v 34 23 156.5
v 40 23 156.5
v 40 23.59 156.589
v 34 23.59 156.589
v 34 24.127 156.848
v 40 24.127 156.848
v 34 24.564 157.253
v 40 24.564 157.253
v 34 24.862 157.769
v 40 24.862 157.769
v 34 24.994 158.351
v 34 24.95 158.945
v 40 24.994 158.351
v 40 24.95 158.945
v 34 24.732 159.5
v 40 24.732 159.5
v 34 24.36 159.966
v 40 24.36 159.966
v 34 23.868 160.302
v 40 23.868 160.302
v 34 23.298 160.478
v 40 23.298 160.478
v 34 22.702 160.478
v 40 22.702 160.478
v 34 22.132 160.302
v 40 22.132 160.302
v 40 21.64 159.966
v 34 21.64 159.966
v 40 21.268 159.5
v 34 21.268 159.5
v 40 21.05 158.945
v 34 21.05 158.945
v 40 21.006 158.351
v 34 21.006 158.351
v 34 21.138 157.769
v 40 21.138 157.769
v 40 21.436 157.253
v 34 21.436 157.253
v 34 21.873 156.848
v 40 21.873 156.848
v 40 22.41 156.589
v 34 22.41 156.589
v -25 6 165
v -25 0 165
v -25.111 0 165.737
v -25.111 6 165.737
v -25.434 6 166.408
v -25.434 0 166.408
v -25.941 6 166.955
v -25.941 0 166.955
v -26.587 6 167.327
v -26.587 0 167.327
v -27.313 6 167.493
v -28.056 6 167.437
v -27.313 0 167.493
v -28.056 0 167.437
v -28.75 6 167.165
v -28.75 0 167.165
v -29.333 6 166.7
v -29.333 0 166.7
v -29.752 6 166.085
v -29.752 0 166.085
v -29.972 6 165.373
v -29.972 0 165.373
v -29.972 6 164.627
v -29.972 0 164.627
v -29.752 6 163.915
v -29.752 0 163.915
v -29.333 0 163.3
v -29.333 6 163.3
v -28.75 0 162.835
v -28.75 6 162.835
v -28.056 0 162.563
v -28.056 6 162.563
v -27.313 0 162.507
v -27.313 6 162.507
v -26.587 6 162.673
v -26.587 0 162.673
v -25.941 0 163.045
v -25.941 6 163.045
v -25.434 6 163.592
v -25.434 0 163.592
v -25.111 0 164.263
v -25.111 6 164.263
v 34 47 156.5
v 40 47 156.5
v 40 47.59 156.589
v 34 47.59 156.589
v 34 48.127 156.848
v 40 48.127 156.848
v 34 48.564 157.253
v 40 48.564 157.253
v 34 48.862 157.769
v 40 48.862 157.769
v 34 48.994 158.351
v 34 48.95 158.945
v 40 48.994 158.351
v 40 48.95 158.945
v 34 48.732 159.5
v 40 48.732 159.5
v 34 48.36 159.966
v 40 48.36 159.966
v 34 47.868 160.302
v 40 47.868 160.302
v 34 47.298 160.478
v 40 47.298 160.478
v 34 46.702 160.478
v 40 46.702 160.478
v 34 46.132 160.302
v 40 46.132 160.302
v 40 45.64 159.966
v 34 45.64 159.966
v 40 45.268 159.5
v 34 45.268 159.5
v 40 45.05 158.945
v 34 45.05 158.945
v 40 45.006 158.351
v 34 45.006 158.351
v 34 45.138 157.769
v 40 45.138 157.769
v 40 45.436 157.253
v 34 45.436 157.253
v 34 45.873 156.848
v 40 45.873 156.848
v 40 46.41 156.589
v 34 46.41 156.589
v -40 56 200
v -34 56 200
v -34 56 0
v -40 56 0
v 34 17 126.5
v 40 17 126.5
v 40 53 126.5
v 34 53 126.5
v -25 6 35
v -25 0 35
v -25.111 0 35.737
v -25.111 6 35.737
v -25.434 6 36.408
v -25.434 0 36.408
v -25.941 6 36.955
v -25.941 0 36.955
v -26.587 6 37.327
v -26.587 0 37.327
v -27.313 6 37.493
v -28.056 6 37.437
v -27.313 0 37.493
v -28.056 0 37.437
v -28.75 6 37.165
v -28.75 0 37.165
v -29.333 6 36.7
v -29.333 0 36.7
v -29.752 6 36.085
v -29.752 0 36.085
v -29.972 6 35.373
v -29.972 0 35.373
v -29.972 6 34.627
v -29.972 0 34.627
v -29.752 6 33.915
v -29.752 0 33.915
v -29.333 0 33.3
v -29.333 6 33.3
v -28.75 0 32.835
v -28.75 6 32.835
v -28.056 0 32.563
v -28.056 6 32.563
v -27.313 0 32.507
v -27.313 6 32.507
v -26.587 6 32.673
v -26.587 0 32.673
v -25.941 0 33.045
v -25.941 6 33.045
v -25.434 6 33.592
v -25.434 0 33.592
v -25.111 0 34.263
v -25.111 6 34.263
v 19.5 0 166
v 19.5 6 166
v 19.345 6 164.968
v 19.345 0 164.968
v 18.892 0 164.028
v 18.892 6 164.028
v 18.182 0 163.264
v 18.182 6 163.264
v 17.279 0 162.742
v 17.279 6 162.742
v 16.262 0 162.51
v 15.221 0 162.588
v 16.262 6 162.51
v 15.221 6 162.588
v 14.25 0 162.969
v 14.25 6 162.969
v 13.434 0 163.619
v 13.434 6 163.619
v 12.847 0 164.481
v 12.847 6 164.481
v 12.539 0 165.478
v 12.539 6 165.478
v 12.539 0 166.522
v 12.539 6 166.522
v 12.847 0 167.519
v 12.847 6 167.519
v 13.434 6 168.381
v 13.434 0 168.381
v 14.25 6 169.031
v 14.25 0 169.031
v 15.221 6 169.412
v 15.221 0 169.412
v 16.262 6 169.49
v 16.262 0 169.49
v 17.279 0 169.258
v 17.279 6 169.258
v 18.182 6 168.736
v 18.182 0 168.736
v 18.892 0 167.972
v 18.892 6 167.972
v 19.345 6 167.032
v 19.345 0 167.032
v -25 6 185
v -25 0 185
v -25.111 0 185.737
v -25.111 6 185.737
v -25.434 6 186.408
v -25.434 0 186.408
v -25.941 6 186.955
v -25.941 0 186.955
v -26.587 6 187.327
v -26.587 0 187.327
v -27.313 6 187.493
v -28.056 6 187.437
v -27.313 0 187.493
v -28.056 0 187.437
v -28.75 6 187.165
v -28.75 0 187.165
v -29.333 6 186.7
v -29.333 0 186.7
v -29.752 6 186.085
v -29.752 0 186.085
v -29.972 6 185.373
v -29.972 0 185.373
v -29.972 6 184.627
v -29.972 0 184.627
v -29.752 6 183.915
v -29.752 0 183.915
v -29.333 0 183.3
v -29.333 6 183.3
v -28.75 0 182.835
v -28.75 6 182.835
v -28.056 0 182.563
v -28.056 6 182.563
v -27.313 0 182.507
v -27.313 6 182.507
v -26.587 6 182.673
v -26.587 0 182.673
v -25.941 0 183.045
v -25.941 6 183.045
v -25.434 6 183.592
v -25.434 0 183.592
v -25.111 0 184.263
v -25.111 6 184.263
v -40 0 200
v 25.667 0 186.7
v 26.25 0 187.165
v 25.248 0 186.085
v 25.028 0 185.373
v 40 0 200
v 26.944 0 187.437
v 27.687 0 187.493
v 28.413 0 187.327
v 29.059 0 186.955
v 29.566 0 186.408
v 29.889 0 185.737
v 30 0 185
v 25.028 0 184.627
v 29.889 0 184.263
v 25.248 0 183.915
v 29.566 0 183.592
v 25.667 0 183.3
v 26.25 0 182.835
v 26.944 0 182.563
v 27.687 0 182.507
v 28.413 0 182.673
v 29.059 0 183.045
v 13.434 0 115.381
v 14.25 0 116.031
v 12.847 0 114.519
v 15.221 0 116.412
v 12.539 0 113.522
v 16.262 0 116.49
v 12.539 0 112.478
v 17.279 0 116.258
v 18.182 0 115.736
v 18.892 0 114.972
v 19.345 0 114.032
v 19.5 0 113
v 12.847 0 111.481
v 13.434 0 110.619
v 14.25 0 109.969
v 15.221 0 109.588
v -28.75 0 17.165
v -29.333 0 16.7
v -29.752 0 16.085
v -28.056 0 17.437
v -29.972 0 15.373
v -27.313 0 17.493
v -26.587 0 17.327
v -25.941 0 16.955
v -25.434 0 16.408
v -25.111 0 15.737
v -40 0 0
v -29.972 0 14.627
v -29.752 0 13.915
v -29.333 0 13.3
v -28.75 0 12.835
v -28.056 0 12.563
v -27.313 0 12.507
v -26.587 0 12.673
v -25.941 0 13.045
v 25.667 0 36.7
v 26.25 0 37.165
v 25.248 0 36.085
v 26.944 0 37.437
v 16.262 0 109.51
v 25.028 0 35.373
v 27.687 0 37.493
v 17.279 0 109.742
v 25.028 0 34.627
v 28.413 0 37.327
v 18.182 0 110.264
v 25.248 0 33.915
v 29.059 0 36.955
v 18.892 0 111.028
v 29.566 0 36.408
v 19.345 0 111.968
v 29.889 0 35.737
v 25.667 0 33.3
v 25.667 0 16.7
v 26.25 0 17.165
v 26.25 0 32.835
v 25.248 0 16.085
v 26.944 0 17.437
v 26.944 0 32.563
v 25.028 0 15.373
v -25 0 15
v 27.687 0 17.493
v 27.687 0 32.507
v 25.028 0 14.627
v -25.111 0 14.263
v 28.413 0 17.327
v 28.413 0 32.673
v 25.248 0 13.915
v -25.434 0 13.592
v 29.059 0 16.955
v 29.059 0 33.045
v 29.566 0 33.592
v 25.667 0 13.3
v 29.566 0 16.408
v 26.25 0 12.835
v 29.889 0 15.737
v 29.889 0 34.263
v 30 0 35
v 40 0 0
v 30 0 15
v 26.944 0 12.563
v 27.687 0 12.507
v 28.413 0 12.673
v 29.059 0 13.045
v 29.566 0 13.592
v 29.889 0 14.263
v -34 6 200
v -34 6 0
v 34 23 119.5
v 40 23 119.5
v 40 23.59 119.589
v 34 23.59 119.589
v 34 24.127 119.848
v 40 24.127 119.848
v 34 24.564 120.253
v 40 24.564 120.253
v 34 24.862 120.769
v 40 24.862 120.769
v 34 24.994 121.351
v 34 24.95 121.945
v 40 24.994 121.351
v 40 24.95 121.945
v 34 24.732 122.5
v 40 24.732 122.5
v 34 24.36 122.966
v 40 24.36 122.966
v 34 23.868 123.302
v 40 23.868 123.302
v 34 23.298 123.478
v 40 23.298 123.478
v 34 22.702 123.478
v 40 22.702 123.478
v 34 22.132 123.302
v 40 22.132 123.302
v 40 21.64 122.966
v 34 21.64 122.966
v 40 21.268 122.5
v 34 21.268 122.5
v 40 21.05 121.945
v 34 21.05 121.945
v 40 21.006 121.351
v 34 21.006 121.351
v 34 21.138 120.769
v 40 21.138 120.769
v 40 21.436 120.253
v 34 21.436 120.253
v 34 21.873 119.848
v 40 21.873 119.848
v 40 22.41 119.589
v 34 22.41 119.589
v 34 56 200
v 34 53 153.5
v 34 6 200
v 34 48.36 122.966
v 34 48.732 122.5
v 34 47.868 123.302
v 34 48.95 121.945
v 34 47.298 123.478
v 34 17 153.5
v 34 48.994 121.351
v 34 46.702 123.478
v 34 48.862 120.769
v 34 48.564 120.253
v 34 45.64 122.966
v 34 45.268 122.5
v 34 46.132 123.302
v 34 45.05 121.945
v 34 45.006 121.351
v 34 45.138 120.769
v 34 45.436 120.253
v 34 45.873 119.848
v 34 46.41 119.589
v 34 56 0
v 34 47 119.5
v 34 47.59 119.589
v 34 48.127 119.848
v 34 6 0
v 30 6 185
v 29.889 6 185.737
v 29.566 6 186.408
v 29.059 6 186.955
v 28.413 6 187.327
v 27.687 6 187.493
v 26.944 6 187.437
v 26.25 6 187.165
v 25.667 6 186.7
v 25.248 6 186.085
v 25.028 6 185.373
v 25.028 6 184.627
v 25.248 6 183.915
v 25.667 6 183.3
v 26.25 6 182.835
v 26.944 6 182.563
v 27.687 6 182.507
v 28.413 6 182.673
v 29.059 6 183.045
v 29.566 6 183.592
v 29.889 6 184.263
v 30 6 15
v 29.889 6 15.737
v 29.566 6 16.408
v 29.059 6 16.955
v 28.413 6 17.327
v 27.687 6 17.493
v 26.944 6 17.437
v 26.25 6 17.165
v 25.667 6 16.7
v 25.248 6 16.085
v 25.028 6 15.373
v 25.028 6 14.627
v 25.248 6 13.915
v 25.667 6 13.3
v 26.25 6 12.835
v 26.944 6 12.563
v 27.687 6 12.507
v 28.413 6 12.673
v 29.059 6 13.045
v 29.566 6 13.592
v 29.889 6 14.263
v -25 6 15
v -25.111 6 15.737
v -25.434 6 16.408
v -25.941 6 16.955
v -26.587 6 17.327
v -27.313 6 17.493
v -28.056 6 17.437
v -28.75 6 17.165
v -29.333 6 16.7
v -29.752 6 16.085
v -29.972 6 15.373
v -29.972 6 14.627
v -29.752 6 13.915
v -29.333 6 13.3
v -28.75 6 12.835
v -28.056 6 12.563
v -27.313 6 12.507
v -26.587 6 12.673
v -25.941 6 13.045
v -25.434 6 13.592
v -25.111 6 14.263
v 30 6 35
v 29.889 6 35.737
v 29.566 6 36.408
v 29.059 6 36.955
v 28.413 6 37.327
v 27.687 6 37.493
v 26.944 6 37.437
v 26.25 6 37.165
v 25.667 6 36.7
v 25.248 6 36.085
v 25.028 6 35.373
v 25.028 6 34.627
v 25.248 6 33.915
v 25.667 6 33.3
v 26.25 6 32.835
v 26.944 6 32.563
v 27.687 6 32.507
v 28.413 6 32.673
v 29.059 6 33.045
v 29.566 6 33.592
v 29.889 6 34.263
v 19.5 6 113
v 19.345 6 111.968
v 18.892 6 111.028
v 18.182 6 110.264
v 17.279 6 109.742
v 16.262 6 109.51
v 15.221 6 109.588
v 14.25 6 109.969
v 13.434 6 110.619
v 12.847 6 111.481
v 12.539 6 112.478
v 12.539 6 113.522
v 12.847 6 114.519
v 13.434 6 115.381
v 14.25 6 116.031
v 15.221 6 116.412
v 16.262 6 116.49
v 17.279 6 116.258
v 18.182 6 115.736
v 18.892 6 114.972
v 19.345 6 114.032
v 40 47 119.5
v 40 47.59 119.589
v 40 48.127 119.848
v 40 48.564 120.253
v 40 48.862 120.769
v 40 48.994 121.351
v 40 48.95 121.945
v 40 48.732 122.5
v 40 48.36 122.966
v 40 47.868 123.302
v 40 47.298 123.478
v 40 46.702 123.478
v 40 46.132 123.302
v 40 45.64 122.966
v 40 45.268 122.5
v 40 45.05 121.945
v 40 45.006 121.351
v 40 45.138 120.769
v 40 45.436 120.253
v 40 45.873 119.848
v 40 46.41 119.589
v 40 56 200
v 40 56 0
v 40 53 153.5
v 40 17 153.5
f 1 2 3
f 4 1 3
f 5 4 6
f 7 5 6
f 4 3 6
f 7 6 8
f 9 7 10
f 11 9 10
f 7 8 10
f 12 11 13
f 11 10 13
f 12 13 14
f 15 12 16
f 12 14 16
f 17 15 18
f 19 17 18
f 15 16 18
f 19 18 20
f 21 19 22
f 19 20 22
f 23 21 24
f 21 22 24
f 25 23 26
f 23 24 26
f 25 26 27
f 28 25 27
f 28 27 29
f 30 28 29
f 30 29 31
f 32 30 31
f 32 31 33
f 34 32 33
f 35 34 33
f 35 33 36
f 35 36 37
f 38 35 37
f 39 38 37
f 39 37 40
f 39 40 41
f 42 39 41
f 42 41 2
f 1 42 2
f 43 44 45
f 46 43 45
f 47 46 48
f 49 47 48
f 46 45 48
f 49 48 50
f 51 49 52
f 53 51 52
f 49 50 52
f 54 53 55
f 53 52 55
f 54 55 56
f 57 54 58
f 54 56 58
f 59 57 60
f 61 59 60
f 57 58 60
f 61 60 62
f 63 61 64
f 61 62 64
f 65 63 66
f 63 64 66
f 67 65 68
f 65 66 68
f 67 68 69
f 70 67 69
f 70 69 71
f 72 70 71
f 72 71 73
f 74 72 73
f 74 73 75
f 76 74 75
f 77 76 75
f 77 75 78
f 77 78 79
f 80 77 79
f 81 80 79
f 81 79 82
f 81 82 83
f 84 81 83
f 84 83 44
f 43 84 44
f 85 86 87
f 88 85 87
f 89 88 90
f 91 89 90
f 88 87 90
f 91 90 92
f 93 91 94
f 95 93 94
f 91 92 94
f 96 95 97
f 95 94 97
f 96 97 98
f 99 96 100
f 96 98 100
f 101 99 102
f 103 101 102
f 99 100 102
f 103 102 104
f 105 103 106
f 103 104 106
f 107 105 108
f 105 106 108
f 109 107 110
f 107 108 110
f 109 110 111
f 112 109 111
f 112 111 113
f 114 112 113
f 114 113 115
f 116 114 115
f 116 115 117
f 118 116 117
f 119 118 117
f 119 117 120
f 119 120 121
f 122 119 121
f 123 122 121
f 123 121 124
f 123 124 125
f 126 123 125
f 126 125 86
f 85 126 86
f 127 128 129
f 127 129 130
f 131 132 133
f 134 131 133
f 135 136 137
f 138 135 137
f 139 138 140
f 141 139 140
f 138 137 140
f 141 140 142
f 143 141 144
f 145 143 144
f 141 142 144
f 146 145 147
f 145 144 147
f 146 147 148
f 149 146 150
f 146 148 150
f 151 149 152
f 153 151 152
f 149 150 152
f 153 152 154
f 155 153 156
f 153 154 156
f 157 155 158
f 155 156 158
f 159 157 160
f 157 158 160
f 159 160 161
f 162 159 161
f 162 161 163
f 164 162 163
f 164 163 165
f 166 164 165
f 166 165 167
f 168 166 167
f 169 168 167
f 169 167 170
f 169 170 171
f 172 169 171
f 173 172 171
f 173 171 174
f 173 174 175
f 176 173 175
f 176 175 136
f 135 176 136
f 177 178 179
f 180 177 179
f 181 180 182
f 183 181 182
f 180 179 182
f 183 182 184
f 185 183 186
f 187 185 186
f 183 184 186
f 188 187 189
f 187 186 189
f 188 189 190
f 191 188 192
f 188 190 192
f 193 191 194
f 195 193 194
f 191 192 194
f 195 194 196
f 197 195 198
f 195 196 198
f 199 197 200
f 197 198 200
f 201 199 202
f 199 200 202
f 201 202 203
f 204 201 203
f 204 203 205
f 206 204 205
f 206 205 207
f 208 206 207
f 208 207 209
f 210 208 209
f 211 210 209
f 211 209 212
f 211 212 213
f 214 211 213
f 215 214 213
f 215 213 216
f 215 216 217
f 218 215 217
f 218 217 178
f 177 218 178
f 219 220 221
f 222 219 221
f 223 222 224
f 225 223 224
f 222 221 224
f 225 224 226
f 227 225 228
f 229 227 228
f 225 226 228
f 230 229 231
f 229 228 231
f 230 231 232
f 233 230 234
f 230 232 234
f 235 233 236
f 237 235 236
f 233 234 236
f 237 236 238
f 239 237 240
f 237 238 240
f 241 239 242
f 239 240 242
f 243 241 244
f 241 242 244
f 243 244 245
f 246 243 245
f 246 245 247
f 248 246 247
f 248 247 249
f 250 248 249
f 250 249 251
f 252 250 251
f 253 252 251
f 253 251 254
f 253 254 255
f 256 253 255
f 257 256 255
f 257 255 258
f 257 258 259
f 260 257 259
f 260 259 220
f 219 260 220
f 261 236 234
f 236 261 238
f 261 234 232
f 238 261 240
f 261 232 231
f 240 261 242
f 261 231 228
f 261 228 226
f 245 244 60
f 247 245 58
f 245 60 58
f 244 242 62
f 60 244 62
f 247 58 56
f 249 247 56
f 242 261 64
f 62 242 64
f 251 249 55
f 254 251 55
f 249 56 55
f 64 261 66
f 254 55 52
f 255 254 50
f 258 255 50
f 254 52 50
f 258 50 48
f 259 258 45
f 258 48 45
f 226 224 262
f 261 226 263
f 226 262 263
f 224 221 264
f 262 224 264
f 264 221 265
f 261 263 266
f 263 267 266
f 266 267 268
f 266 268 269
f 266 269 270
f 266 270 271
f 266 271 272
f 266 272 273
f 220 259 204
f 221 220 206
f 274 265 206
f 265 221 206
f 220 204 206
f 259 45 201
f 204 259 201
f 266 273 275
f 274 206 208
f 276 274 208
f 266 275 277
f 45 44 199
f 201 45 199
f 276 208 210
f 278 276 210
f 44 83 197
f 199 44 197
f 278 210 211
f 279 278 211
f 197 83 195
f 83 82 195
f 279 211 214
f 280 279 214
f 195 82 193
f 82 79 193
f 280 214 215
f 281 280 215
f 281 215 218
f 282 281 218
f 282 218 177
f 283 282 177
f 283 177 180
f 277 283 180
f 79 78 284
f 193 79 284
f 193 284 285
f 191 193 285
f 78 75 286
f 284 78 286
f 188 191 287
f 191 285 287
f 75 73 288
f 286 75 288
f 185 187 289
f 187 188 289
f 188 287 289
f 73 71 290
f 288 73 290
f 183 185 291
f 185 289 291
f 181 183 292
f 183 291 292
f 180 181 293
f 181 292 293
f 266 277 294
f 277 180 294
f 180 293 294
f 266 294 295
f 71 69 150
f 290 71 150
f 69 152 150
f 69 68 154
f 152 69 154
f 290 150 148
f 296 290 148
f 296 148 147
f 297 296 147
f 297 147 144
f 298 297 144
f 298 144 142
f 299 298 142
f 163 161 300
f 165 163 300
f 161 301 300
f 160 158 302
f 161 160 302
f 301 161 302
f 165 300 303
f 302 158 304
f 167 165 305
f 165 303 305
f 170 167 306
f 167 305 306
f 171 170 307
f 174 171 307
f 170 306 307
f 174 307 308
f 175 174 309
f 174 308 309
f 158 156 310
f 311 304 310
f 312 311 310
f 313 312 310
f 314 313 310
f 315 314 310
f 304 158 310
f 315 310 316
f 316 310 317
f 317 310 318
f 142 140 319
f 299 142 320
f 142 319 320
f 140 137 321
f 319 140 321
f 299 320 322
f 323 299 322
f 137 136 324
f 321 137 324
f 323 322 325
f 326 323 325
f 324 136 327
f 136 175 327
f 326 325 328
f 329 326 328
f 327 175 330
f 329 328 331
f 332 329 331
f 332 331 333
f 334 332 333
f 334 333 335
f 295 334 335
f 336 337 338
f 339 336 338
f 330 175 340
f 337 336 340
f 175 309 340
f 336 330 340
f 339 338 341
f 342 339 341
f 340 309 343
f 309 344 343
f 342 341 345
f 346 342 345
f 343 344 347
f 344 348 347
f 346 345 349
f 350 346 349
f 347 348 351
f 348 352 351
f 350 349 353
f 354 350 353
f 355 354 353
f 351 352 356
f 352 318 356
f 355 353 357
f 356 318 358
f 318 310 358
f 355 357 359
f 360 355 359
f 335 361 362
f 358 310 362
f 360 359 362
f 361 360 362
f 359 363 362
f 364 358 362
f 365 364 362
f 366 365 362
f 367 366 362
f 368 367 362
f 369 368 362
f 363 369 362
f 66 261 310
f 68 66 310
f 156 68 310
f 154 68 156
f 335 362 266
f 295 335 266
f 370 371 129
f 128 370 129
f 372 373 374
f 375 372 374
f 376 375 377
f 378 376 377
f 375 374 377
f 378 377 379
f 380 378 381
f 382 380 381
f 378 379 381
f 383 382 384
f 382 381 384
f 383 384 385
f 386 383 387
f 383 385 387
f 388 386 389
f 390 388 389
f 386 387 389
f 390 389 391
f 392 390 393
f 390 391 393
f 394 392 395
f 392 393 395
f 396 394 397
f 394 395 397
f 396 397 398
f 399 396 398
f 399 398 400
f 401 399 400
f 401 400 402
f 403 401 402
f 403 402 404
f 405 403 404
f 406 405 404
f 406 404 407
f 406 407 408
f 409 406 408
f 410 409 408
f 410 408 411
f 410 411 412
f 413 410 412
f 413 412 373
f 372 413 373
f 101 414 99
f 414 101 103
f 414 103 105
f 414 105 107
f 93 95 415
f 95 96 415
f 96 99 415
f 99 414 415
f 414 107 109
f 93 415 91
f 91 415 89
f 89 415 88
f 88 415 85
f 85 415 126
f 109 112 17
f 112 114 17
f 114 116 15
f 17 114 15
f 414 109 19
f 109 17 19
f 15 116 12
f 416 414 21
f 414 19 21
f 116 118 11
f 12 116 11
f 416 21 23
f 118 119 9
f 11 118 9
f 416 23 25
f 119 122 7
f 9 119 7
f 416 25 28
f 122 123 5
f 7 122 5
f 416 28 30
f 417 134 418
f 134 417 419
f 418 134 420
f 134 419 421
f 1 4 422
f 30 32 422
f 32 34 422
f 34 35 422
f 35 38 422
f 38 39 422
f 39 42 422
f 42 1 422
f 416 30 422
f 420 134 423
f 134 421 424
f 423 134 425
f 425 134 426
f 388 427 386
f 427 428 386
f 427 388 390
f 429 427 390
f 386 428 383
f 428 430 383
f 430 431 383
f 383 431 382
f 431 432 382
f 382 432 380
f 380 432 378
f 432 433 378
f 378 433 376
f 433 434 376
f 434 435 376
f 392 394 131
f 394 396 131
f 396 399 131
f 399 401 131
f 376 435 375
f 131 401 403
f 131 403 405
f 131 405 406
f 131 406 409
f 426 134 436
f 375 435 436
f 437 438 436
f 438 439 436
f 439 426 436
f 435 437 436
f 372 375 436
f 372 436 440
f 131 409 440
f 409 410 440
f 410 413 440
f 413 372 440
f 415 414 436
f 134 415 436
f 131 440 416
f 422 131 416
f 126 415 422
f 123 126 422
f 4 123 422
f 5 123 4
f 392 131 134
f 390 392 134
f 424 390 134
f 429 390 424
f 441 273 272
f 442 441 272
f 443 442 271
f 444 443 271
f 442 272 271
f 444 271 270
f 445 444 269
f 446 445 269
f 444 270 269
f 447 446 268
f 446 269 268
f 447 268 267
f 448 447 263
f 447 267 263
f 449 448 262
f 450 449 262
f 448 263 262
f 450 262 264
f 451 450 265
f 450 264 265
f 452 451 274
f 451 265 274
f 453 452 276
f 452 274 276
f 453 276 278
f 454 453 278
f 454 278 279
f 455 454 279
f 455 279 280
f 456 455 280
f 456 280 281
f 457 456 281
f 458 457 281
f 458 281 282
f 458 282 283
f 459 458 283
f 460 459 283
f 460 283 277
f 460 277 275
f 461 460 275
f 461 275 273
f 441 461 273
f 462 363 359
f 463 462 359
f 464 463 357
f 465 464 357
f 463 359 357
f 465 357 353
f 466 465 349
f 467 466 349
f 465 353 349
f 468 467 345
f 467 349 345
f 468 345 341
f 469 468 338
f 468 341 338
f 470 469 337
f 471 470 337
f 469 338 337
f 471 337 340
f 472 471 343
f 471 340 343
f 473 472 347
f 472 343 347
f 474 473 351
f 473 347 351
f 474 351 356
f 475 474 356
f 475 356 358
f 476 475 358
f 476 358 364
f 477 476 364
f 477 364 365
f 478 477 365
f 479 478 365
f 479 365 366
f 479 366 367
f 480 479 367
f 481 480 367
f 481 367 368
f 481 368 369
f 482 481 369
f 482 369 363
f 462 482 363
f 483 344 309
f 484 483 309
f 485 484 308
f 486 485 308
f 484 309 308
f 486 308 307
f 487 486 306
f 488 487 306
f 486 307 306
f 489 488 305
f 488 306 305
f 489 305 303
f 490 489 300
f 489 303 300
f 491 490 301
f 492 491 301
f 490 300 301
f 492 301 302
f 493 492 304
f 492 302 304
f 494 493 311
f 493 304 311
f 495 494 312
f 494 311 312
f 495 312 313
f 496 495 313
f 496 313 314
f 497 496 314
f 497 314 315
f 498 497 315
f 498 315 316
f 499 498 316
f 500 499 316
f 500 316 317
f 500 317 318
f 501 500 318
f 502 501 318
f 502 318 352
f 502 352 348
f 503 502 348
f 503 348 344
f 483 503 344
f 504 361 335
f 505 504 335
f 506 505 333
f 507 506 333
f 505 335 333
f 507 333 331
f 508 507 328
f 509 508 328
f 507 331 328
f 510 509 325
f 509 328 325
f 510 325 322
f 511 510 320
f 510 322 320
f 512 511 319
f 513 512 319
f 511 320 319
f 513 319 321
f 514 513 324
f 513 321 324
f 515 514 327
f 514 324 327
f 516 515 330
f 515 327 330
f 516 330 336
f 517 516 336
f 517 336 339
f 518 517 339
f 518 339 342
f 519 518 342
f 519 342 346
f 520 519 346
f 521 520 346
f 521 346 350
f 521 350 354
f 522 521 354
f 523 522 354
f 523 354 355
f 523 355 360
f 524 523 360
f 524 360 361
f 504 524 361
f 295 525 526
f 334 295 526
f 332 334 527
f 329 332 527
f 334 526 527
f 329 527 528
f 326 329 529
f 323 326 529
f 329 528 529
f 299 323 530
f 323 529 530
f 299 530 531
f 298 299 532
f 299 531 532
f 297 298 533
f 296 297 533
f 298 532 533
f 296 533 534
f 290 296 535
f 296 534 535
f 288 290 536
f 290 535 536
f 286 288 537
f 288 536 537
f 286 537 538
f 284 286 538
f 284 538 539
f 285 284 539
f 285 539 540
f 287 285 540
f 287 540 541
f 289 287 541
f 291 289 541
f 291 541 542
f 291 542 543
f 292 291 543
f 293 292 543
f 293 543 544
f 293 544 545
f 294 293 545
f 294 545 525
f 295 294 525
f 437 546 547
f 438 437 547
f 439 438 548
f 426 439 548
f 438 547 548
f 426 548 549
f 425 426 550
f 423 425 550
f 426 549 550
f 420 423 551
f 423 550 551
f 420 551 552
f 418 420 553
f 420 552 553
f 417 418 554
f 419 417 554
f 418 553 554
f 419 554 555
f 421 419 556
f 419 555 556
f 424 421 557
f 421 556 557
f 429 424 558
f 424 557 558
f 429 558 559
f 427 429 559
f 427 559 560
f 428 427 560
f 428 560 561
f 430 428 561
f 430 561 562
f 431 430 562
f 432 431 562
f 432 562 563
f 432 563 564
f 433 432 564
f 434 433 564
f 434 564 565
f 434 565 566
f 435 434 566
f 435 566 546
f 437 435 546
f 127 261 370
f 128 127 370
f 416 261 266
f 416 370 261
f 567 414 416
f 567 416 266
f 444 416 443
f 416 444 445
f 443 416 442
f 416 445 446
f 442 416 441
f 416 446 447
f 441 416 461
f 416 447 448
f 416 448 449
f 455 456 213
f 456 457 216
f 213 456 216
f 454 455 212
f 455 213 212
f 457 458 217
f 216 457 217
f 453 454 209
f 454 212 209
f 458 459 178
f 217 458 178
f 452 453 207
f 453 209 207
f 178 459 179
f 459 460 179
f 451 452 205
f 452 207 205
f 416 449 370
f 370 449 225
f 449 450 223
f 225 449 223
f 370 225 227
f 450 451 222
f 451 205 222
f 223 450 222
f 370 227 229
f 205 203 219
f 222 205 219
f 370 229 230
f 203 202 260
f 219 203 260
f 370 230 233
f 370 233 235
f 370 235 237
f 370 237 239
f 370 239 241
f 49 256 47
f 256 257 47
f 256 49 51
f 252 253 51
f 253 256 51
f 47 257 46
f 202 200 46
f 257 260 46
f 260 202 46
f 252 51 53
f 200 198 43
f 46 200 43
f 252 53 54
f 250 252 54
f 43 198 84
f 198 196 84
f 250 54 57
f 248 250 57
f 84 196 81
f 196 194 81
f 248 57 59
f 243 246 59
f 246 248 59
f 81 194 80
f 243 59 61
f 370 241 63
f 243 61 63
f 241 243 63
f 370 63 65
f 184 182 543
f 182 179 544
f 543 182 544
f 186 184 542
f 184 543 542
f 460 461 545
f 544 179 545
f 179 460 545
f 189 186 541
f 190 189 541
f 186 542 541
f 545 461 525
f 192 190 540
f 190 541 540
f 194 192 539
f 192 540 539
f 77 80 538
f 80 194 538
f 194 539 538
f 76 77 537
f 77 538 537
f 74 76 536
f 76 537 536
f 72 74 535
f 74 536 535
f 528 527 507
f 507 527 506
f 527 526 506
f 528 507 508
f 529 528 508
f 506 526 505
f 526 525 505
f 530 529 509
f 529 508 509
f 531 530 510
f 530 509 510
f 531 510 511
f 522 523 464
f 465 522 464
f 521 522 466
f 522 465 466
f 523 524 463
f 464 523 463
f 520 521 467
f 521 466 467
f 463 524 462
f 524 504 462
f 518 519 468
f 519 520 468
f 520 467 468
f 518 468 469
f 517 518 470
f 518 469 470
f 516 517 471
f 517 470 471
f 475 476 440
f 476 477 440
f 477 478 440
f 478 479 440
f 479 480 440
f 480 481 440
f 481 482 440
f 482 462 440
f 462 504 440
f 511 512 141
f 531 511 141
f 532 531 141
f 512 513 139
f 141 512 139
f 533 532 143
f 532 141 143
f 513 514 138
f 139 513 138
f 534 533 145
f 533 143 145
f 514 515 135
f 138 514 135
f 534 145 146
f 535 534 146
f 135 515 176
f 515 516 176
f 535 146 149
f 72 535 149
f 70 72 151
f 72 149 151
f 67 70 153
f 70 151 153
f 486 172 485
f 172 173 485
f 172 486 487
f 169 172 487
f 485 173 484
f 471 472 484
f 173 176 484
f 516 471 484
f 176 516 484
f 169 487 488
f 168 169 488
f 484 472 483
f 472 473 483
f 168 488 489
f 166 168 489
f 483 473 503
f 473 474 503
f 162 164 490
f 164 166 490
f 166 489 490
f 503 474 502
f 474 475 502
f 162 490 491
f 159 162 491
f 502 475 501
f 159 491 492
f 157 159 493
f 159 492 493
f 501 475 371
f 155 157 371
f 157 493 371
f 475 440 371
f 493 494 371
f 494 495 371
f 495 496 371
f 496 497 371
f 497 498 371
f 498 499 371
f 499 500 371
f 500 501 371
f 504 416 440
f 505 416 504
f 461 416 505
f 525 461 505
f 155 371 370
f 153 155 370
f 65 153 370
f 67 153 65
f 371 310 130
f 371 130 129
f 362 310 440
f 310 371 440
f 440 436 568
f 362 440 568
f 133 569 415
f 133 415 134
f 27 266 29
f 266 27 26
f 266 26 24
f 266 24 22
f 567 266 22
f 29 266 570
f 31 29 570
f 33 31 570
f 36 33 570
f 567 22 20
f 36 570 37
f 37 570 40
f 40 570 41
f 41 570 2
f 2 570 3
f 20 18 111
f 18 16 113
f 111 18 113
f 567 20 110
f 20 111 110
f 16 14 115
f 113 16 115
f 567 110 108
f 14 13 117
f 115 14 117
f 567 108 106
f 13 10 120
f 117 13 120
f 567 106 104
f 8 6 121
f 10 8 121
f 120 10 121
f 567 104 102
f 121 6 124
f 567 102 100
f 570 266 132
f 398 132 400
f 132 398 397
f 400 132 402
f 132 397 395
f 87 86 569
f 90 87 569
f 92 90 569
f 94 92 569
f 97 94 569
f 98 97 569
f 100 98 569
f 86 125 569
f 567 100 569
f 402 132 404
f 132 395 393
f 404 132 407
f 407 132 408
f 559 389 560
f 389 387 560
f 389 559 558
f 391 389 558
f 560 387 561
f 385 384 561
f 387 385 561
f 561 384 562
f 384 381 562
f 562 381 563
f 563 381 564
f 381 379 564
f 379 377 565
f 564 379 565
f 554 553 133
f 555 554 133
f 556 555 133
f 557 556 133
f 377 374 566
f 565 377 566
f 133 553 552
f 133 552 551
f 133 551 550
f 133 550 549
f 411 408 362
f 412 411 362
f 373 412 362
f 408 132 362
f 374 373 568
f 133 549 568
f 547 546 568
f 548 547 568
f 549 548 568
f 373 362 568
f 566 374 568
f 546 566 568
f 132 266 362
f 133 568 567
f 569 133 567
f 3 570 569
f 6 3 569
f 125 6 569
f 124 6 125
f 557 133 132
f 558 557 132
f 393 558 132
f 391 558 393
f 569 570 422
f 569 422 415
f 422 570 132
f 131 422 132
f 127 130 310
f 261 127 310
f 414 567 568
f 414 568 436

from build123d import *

# Parameters (mm, degrees)
EXTRUDE_1_DEPTH     = 200
CUT_EXTRUDE_2_REACH = 58
SKETCH_4_R          = 2.5
SKETCH_8_R          = 2
SKETCH_8_W          = 27
SKETCH_8_H          = 36
CUT_EXTRUDE_5_DEPTH = 10
SKETCH_9_R          = 3.5
CUT_EXTRUDE_6_DEPTH = 10
SKETCH_10_R         = 3.500000002
SKETCH_10_R_2       = 3.5
CUT_EXTRUDE_7_DEPTH = 10


with BuildPart() as part:
    # 草图1 → 凸台-拉伸1 (new body)
    with BuildSketch(Plane.XY):
        Polygon((-40, 0), (40, 0), (40, 56), (34, 56), (34, 6), (-34, 6), (-34, 56), (-40, 56), align=None)
    extrude(amount=EXTRUDE_1_DEPTH)

    # 草图4 → 切除-拉伸2 (cut, up to next)
    with BuildSketch(Plane.XZ, mode=Mode.PRIVATE) as cut_extrude_2_sk1:
        with Locations((-27.5, 185)):
            Circle(SKETCH_4_R)
    cut_extrude_2_tool1 = extrude(cut_extrude_2_sk1.sketch, amount=-CUT_EXTRUDE_2_REACH, mode=Mode.PRIVATE) & part.part
    add(cut_extrude_2_tool1.solids().sort_by_distance((-27.5, 0, 185))[0], mode=Mode.SUBTRACT)
    # 草图4 → 切除-拉伸2 (cut, up to next)
    with BuildSketch(Plane.XZ, mode=Mode.PRIVATE) as cut_extrude_2_sk2:
        with Locations((27.5, 185)):
            Circle(SKETCH_4_R)
    cut_extrude_2_tool2 = extrude(cut_extrude_2_sk2.sketch, amount=-CUT_EXTRUDE_2_REACH, mode=Mode.PRIVATE) & part.part
    add(cut_extrude_2_tool2.solids().sort_by_distance((27.5, 0, 185))[0], mode=Mode.SUBTRACT)
    # 草图4 → 切除-拉伸2 (cut, up to next)
    with BuildSketch(Plane.XZ, mode=Mode.PRIVATE) as cut_extrude_2_sk3:
        with Locations((-27.5, 165)):
            Circle(SKETCH_4_R)
    cut_extrude_2_tool3 = extrude(cut_extrude_2_sk3.sketch, amount=-CUT_EXTRUDE_2_REACH, mode=Mode.PRIVATE) & part.part
    add(cut_extrude_2_tool3.solids().sort_by_distance((-27.5, 0, 165))[0], mode=Mode.SUBTRACT)
    # 草图4 → 切除-拉伸2 (cut, up to next)
    with BuildSketch(Plane.XZ, mode=Mode.PRIVATE) as cut_extrude_2_sk4:
        with Locations((27.5, 35)):
            Circle(SKETCH_4_R)
    cut_extrude_2_tool4 = extrude(cut_extrude_2_sk4.sketch, amount=-CUT_EXTRUDE_2_REACH, mode=Mode.PRIVATE) & part.part
    add(cut_extrude_2_tool4.solids().sort_by_distance((27.5, 0, 35))[0], mode=Mode.SUBTRACT)
    # 草图4 → 切除-拉伸2 (cut, up to next)
    with BuildSketch(Plane.XZ, mode=Mode.PRIVATE) as cut_extrude_2_sk5:
        with Locations((-27.5, 35)):
            Circle(SKETCH_4_R)
    cut_extrude_2_tool5 = extrude(cut_extrude_2_sk5.sketch, amount=-CUT_EXTRUDE_2_REACH, mode=Mode.PRIVATE) & part.part
    add(cut_extrude_2_tool5.solids().sort_by_distance((-27.5, 0, 35))[0], mode=Mode.SUBTRACT)
    # 草图4 → 切除-拉伸2 (cut, up to next)
    with BuildSketch(Plane.XZ, mode=Mode.PRIVATE) as cut_extrude_2_sk6:
        with Locations((27.5, 15)):
            Circle(SKETCH_4_R)
    cut_extrude_2_tool6 = extrude(cut_extrude_2_sk6.sketch, amount=-CUT_EXTRUDE_2_REACH, mode=Mode.PRIVATE) & part.part
    add(cut_extrude_2_tool6.solids().sort_by_distance((27.5, 0, 15))[0], mode=Mode.SUBTRACT)
    # 草图4 → 切除-拉伸2 (cut, up to next)
    with BuildSketch(Plane.XZ, mode=Mode.PRIVATE) as cut_extrude_2_sk7:
        with Locations((-27.5, 15)):
            Circle(SKETCH_4_R)
    cut_extrude_2_tool7 = extrude(cut_extrude_2_sk7.sketch, amount=-CUT_EXTRUDE_2_REACH, mode=Mode.PRIVATE) & part.part
    add(cut_extrude_2_tool7.solids().sort_by_distance((-27.5, 0, 15))[0], mode=Mode.SUBTRACT)

    # 草图8 → 切除-拉伸5 (cut)
    with BuildSketch(Plane(origin=(40, 0, 0), x_dir=(0, 0, -1), z_dir=(1, 0, 0))):
        with Locations((-121.5, 23)):
            Circle(SKETCH_8_R)
        with Locations((-121.5, 47)):
            Circle(SKETCH_8_R)
        with Locations((-158.5, 47)):
            Circle(SKETCH_8_R)
        with Locations((-158.5, 23)):
            Circle(SKETCH_8_R)
        with Locations((-140, 35)):
            Rectangle(SKETCH_8_W, SKETCH_8_H)
    extrude(amount=-CUT_EXTRUDE_5_DEPTH, mode=Mode.SUBTRACT)

    # 草图9 → 切除-拉伸6 (cut)
    with BuildSketch(Plane(origin=(0, 6, 0), x_dir=(1, 0, 0), z_dir=(0, 1, 0))):
        with Locations((15.999999998, -166)):
            Circle(SKETCH_9_R)
    extrude(amount=-CUT_EXTRUDE_6_DEPTH, mode=Mode.SUBTRACT)

    # 草图10 → 切除-拉伸7 (cut)
    with BuildSketch(Plane(origin=(0, 6, 0), x_dir=(1, 0, 0), z_dir=(0, 1, 0))):
        with Locations((15.999999998, -113)):
            Circle(SKETCH_10_R)
        with Locations((15.999999998, -166)):
            Circle(SKETCH_10_R_2)
    extrude(amount=-CUT_EXTRUDE_7_DEPTH, mode=Mode.SUBTRACT)


solid = part.part
